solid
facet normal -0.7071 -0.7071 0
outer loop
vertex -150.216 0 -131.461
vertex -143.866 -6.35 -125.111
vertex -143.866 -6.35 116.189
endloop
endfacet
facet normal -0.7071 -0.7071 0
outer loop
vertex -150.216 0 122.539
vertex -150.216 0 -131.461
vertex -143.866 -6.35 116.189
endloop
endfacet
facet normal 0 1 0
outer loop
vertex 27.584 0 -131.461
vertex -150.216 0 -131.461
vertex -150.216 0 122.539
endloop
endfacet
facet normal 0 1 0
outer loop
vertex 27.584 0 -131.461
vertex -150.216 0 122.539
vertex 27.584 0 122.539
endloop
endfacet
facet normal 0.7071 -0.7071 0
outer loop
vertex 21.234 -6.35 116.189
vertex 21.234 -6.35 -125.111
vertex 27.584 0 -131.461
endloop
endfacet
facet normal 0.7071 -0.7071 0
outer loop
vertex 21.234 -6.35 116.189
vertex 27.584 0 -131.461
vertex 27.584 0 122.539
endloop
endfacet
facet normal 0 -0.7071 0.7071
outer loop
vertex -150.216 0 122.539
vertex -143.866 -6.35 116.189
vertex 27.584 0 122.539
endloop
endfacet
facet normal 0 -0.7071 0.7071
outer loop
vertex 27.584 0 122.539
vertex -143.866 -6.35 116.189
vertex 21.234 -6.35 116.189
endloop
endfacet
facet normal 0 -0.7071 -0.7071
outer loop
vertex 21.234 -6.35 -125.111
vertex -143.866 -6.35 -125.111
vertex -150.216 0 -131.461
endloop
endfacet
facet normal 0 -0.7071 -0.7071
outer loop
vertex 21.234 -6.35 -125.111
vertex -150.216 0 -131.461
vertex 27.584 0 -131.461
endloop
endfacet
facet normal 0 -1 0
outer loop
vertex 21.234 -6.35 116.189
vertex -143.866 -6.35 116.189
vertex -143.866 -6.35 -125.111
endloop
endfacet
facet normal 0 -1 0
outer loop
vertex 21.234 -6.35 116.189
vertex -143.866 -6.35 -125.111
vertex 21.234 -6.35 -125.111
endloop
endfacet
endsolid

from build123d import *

# Parameters (mm, degrees)
F0_W     = 177.8
F0_H     = 254
F1_DEPTH = 6.35
F2_SIZE2 = 6.34999
F2_SIZE  = 6.34999


# Not quite as in the source:
# - a fillet or chamfer is up to 0.001 mm smaller than in the source, because OpenCascade refuses the exact size


with BuildPart() as f1:
    # F0 (on Front) → F1 (new body)
    with BuildSketch(Plane.XZ):
        with Locations((-61.3160093542, -4.4609885663)):
            Rectangle(F0_W, F0_H)
    extrude(amount=F1_DEPTH)

    # F2 (size 6.35 and 6.35 in the source; OpenCascade refuses exactly that, so slightly less here)
    f2_edges = [f1.edges().sort_by_distance(p)[0] for p in [
        (-61.316009, -6.35, 122.539011),
        (-150.216009, -6.35, -4.460989),
        (-61.316009, -6.35, -131.460989),
        (27.583991, -6.35, -4.460989),
    ]]
    chamfer(f2_edges, length=F2_SIZE, length2=F2_SIZE2)


solid = f1.part
